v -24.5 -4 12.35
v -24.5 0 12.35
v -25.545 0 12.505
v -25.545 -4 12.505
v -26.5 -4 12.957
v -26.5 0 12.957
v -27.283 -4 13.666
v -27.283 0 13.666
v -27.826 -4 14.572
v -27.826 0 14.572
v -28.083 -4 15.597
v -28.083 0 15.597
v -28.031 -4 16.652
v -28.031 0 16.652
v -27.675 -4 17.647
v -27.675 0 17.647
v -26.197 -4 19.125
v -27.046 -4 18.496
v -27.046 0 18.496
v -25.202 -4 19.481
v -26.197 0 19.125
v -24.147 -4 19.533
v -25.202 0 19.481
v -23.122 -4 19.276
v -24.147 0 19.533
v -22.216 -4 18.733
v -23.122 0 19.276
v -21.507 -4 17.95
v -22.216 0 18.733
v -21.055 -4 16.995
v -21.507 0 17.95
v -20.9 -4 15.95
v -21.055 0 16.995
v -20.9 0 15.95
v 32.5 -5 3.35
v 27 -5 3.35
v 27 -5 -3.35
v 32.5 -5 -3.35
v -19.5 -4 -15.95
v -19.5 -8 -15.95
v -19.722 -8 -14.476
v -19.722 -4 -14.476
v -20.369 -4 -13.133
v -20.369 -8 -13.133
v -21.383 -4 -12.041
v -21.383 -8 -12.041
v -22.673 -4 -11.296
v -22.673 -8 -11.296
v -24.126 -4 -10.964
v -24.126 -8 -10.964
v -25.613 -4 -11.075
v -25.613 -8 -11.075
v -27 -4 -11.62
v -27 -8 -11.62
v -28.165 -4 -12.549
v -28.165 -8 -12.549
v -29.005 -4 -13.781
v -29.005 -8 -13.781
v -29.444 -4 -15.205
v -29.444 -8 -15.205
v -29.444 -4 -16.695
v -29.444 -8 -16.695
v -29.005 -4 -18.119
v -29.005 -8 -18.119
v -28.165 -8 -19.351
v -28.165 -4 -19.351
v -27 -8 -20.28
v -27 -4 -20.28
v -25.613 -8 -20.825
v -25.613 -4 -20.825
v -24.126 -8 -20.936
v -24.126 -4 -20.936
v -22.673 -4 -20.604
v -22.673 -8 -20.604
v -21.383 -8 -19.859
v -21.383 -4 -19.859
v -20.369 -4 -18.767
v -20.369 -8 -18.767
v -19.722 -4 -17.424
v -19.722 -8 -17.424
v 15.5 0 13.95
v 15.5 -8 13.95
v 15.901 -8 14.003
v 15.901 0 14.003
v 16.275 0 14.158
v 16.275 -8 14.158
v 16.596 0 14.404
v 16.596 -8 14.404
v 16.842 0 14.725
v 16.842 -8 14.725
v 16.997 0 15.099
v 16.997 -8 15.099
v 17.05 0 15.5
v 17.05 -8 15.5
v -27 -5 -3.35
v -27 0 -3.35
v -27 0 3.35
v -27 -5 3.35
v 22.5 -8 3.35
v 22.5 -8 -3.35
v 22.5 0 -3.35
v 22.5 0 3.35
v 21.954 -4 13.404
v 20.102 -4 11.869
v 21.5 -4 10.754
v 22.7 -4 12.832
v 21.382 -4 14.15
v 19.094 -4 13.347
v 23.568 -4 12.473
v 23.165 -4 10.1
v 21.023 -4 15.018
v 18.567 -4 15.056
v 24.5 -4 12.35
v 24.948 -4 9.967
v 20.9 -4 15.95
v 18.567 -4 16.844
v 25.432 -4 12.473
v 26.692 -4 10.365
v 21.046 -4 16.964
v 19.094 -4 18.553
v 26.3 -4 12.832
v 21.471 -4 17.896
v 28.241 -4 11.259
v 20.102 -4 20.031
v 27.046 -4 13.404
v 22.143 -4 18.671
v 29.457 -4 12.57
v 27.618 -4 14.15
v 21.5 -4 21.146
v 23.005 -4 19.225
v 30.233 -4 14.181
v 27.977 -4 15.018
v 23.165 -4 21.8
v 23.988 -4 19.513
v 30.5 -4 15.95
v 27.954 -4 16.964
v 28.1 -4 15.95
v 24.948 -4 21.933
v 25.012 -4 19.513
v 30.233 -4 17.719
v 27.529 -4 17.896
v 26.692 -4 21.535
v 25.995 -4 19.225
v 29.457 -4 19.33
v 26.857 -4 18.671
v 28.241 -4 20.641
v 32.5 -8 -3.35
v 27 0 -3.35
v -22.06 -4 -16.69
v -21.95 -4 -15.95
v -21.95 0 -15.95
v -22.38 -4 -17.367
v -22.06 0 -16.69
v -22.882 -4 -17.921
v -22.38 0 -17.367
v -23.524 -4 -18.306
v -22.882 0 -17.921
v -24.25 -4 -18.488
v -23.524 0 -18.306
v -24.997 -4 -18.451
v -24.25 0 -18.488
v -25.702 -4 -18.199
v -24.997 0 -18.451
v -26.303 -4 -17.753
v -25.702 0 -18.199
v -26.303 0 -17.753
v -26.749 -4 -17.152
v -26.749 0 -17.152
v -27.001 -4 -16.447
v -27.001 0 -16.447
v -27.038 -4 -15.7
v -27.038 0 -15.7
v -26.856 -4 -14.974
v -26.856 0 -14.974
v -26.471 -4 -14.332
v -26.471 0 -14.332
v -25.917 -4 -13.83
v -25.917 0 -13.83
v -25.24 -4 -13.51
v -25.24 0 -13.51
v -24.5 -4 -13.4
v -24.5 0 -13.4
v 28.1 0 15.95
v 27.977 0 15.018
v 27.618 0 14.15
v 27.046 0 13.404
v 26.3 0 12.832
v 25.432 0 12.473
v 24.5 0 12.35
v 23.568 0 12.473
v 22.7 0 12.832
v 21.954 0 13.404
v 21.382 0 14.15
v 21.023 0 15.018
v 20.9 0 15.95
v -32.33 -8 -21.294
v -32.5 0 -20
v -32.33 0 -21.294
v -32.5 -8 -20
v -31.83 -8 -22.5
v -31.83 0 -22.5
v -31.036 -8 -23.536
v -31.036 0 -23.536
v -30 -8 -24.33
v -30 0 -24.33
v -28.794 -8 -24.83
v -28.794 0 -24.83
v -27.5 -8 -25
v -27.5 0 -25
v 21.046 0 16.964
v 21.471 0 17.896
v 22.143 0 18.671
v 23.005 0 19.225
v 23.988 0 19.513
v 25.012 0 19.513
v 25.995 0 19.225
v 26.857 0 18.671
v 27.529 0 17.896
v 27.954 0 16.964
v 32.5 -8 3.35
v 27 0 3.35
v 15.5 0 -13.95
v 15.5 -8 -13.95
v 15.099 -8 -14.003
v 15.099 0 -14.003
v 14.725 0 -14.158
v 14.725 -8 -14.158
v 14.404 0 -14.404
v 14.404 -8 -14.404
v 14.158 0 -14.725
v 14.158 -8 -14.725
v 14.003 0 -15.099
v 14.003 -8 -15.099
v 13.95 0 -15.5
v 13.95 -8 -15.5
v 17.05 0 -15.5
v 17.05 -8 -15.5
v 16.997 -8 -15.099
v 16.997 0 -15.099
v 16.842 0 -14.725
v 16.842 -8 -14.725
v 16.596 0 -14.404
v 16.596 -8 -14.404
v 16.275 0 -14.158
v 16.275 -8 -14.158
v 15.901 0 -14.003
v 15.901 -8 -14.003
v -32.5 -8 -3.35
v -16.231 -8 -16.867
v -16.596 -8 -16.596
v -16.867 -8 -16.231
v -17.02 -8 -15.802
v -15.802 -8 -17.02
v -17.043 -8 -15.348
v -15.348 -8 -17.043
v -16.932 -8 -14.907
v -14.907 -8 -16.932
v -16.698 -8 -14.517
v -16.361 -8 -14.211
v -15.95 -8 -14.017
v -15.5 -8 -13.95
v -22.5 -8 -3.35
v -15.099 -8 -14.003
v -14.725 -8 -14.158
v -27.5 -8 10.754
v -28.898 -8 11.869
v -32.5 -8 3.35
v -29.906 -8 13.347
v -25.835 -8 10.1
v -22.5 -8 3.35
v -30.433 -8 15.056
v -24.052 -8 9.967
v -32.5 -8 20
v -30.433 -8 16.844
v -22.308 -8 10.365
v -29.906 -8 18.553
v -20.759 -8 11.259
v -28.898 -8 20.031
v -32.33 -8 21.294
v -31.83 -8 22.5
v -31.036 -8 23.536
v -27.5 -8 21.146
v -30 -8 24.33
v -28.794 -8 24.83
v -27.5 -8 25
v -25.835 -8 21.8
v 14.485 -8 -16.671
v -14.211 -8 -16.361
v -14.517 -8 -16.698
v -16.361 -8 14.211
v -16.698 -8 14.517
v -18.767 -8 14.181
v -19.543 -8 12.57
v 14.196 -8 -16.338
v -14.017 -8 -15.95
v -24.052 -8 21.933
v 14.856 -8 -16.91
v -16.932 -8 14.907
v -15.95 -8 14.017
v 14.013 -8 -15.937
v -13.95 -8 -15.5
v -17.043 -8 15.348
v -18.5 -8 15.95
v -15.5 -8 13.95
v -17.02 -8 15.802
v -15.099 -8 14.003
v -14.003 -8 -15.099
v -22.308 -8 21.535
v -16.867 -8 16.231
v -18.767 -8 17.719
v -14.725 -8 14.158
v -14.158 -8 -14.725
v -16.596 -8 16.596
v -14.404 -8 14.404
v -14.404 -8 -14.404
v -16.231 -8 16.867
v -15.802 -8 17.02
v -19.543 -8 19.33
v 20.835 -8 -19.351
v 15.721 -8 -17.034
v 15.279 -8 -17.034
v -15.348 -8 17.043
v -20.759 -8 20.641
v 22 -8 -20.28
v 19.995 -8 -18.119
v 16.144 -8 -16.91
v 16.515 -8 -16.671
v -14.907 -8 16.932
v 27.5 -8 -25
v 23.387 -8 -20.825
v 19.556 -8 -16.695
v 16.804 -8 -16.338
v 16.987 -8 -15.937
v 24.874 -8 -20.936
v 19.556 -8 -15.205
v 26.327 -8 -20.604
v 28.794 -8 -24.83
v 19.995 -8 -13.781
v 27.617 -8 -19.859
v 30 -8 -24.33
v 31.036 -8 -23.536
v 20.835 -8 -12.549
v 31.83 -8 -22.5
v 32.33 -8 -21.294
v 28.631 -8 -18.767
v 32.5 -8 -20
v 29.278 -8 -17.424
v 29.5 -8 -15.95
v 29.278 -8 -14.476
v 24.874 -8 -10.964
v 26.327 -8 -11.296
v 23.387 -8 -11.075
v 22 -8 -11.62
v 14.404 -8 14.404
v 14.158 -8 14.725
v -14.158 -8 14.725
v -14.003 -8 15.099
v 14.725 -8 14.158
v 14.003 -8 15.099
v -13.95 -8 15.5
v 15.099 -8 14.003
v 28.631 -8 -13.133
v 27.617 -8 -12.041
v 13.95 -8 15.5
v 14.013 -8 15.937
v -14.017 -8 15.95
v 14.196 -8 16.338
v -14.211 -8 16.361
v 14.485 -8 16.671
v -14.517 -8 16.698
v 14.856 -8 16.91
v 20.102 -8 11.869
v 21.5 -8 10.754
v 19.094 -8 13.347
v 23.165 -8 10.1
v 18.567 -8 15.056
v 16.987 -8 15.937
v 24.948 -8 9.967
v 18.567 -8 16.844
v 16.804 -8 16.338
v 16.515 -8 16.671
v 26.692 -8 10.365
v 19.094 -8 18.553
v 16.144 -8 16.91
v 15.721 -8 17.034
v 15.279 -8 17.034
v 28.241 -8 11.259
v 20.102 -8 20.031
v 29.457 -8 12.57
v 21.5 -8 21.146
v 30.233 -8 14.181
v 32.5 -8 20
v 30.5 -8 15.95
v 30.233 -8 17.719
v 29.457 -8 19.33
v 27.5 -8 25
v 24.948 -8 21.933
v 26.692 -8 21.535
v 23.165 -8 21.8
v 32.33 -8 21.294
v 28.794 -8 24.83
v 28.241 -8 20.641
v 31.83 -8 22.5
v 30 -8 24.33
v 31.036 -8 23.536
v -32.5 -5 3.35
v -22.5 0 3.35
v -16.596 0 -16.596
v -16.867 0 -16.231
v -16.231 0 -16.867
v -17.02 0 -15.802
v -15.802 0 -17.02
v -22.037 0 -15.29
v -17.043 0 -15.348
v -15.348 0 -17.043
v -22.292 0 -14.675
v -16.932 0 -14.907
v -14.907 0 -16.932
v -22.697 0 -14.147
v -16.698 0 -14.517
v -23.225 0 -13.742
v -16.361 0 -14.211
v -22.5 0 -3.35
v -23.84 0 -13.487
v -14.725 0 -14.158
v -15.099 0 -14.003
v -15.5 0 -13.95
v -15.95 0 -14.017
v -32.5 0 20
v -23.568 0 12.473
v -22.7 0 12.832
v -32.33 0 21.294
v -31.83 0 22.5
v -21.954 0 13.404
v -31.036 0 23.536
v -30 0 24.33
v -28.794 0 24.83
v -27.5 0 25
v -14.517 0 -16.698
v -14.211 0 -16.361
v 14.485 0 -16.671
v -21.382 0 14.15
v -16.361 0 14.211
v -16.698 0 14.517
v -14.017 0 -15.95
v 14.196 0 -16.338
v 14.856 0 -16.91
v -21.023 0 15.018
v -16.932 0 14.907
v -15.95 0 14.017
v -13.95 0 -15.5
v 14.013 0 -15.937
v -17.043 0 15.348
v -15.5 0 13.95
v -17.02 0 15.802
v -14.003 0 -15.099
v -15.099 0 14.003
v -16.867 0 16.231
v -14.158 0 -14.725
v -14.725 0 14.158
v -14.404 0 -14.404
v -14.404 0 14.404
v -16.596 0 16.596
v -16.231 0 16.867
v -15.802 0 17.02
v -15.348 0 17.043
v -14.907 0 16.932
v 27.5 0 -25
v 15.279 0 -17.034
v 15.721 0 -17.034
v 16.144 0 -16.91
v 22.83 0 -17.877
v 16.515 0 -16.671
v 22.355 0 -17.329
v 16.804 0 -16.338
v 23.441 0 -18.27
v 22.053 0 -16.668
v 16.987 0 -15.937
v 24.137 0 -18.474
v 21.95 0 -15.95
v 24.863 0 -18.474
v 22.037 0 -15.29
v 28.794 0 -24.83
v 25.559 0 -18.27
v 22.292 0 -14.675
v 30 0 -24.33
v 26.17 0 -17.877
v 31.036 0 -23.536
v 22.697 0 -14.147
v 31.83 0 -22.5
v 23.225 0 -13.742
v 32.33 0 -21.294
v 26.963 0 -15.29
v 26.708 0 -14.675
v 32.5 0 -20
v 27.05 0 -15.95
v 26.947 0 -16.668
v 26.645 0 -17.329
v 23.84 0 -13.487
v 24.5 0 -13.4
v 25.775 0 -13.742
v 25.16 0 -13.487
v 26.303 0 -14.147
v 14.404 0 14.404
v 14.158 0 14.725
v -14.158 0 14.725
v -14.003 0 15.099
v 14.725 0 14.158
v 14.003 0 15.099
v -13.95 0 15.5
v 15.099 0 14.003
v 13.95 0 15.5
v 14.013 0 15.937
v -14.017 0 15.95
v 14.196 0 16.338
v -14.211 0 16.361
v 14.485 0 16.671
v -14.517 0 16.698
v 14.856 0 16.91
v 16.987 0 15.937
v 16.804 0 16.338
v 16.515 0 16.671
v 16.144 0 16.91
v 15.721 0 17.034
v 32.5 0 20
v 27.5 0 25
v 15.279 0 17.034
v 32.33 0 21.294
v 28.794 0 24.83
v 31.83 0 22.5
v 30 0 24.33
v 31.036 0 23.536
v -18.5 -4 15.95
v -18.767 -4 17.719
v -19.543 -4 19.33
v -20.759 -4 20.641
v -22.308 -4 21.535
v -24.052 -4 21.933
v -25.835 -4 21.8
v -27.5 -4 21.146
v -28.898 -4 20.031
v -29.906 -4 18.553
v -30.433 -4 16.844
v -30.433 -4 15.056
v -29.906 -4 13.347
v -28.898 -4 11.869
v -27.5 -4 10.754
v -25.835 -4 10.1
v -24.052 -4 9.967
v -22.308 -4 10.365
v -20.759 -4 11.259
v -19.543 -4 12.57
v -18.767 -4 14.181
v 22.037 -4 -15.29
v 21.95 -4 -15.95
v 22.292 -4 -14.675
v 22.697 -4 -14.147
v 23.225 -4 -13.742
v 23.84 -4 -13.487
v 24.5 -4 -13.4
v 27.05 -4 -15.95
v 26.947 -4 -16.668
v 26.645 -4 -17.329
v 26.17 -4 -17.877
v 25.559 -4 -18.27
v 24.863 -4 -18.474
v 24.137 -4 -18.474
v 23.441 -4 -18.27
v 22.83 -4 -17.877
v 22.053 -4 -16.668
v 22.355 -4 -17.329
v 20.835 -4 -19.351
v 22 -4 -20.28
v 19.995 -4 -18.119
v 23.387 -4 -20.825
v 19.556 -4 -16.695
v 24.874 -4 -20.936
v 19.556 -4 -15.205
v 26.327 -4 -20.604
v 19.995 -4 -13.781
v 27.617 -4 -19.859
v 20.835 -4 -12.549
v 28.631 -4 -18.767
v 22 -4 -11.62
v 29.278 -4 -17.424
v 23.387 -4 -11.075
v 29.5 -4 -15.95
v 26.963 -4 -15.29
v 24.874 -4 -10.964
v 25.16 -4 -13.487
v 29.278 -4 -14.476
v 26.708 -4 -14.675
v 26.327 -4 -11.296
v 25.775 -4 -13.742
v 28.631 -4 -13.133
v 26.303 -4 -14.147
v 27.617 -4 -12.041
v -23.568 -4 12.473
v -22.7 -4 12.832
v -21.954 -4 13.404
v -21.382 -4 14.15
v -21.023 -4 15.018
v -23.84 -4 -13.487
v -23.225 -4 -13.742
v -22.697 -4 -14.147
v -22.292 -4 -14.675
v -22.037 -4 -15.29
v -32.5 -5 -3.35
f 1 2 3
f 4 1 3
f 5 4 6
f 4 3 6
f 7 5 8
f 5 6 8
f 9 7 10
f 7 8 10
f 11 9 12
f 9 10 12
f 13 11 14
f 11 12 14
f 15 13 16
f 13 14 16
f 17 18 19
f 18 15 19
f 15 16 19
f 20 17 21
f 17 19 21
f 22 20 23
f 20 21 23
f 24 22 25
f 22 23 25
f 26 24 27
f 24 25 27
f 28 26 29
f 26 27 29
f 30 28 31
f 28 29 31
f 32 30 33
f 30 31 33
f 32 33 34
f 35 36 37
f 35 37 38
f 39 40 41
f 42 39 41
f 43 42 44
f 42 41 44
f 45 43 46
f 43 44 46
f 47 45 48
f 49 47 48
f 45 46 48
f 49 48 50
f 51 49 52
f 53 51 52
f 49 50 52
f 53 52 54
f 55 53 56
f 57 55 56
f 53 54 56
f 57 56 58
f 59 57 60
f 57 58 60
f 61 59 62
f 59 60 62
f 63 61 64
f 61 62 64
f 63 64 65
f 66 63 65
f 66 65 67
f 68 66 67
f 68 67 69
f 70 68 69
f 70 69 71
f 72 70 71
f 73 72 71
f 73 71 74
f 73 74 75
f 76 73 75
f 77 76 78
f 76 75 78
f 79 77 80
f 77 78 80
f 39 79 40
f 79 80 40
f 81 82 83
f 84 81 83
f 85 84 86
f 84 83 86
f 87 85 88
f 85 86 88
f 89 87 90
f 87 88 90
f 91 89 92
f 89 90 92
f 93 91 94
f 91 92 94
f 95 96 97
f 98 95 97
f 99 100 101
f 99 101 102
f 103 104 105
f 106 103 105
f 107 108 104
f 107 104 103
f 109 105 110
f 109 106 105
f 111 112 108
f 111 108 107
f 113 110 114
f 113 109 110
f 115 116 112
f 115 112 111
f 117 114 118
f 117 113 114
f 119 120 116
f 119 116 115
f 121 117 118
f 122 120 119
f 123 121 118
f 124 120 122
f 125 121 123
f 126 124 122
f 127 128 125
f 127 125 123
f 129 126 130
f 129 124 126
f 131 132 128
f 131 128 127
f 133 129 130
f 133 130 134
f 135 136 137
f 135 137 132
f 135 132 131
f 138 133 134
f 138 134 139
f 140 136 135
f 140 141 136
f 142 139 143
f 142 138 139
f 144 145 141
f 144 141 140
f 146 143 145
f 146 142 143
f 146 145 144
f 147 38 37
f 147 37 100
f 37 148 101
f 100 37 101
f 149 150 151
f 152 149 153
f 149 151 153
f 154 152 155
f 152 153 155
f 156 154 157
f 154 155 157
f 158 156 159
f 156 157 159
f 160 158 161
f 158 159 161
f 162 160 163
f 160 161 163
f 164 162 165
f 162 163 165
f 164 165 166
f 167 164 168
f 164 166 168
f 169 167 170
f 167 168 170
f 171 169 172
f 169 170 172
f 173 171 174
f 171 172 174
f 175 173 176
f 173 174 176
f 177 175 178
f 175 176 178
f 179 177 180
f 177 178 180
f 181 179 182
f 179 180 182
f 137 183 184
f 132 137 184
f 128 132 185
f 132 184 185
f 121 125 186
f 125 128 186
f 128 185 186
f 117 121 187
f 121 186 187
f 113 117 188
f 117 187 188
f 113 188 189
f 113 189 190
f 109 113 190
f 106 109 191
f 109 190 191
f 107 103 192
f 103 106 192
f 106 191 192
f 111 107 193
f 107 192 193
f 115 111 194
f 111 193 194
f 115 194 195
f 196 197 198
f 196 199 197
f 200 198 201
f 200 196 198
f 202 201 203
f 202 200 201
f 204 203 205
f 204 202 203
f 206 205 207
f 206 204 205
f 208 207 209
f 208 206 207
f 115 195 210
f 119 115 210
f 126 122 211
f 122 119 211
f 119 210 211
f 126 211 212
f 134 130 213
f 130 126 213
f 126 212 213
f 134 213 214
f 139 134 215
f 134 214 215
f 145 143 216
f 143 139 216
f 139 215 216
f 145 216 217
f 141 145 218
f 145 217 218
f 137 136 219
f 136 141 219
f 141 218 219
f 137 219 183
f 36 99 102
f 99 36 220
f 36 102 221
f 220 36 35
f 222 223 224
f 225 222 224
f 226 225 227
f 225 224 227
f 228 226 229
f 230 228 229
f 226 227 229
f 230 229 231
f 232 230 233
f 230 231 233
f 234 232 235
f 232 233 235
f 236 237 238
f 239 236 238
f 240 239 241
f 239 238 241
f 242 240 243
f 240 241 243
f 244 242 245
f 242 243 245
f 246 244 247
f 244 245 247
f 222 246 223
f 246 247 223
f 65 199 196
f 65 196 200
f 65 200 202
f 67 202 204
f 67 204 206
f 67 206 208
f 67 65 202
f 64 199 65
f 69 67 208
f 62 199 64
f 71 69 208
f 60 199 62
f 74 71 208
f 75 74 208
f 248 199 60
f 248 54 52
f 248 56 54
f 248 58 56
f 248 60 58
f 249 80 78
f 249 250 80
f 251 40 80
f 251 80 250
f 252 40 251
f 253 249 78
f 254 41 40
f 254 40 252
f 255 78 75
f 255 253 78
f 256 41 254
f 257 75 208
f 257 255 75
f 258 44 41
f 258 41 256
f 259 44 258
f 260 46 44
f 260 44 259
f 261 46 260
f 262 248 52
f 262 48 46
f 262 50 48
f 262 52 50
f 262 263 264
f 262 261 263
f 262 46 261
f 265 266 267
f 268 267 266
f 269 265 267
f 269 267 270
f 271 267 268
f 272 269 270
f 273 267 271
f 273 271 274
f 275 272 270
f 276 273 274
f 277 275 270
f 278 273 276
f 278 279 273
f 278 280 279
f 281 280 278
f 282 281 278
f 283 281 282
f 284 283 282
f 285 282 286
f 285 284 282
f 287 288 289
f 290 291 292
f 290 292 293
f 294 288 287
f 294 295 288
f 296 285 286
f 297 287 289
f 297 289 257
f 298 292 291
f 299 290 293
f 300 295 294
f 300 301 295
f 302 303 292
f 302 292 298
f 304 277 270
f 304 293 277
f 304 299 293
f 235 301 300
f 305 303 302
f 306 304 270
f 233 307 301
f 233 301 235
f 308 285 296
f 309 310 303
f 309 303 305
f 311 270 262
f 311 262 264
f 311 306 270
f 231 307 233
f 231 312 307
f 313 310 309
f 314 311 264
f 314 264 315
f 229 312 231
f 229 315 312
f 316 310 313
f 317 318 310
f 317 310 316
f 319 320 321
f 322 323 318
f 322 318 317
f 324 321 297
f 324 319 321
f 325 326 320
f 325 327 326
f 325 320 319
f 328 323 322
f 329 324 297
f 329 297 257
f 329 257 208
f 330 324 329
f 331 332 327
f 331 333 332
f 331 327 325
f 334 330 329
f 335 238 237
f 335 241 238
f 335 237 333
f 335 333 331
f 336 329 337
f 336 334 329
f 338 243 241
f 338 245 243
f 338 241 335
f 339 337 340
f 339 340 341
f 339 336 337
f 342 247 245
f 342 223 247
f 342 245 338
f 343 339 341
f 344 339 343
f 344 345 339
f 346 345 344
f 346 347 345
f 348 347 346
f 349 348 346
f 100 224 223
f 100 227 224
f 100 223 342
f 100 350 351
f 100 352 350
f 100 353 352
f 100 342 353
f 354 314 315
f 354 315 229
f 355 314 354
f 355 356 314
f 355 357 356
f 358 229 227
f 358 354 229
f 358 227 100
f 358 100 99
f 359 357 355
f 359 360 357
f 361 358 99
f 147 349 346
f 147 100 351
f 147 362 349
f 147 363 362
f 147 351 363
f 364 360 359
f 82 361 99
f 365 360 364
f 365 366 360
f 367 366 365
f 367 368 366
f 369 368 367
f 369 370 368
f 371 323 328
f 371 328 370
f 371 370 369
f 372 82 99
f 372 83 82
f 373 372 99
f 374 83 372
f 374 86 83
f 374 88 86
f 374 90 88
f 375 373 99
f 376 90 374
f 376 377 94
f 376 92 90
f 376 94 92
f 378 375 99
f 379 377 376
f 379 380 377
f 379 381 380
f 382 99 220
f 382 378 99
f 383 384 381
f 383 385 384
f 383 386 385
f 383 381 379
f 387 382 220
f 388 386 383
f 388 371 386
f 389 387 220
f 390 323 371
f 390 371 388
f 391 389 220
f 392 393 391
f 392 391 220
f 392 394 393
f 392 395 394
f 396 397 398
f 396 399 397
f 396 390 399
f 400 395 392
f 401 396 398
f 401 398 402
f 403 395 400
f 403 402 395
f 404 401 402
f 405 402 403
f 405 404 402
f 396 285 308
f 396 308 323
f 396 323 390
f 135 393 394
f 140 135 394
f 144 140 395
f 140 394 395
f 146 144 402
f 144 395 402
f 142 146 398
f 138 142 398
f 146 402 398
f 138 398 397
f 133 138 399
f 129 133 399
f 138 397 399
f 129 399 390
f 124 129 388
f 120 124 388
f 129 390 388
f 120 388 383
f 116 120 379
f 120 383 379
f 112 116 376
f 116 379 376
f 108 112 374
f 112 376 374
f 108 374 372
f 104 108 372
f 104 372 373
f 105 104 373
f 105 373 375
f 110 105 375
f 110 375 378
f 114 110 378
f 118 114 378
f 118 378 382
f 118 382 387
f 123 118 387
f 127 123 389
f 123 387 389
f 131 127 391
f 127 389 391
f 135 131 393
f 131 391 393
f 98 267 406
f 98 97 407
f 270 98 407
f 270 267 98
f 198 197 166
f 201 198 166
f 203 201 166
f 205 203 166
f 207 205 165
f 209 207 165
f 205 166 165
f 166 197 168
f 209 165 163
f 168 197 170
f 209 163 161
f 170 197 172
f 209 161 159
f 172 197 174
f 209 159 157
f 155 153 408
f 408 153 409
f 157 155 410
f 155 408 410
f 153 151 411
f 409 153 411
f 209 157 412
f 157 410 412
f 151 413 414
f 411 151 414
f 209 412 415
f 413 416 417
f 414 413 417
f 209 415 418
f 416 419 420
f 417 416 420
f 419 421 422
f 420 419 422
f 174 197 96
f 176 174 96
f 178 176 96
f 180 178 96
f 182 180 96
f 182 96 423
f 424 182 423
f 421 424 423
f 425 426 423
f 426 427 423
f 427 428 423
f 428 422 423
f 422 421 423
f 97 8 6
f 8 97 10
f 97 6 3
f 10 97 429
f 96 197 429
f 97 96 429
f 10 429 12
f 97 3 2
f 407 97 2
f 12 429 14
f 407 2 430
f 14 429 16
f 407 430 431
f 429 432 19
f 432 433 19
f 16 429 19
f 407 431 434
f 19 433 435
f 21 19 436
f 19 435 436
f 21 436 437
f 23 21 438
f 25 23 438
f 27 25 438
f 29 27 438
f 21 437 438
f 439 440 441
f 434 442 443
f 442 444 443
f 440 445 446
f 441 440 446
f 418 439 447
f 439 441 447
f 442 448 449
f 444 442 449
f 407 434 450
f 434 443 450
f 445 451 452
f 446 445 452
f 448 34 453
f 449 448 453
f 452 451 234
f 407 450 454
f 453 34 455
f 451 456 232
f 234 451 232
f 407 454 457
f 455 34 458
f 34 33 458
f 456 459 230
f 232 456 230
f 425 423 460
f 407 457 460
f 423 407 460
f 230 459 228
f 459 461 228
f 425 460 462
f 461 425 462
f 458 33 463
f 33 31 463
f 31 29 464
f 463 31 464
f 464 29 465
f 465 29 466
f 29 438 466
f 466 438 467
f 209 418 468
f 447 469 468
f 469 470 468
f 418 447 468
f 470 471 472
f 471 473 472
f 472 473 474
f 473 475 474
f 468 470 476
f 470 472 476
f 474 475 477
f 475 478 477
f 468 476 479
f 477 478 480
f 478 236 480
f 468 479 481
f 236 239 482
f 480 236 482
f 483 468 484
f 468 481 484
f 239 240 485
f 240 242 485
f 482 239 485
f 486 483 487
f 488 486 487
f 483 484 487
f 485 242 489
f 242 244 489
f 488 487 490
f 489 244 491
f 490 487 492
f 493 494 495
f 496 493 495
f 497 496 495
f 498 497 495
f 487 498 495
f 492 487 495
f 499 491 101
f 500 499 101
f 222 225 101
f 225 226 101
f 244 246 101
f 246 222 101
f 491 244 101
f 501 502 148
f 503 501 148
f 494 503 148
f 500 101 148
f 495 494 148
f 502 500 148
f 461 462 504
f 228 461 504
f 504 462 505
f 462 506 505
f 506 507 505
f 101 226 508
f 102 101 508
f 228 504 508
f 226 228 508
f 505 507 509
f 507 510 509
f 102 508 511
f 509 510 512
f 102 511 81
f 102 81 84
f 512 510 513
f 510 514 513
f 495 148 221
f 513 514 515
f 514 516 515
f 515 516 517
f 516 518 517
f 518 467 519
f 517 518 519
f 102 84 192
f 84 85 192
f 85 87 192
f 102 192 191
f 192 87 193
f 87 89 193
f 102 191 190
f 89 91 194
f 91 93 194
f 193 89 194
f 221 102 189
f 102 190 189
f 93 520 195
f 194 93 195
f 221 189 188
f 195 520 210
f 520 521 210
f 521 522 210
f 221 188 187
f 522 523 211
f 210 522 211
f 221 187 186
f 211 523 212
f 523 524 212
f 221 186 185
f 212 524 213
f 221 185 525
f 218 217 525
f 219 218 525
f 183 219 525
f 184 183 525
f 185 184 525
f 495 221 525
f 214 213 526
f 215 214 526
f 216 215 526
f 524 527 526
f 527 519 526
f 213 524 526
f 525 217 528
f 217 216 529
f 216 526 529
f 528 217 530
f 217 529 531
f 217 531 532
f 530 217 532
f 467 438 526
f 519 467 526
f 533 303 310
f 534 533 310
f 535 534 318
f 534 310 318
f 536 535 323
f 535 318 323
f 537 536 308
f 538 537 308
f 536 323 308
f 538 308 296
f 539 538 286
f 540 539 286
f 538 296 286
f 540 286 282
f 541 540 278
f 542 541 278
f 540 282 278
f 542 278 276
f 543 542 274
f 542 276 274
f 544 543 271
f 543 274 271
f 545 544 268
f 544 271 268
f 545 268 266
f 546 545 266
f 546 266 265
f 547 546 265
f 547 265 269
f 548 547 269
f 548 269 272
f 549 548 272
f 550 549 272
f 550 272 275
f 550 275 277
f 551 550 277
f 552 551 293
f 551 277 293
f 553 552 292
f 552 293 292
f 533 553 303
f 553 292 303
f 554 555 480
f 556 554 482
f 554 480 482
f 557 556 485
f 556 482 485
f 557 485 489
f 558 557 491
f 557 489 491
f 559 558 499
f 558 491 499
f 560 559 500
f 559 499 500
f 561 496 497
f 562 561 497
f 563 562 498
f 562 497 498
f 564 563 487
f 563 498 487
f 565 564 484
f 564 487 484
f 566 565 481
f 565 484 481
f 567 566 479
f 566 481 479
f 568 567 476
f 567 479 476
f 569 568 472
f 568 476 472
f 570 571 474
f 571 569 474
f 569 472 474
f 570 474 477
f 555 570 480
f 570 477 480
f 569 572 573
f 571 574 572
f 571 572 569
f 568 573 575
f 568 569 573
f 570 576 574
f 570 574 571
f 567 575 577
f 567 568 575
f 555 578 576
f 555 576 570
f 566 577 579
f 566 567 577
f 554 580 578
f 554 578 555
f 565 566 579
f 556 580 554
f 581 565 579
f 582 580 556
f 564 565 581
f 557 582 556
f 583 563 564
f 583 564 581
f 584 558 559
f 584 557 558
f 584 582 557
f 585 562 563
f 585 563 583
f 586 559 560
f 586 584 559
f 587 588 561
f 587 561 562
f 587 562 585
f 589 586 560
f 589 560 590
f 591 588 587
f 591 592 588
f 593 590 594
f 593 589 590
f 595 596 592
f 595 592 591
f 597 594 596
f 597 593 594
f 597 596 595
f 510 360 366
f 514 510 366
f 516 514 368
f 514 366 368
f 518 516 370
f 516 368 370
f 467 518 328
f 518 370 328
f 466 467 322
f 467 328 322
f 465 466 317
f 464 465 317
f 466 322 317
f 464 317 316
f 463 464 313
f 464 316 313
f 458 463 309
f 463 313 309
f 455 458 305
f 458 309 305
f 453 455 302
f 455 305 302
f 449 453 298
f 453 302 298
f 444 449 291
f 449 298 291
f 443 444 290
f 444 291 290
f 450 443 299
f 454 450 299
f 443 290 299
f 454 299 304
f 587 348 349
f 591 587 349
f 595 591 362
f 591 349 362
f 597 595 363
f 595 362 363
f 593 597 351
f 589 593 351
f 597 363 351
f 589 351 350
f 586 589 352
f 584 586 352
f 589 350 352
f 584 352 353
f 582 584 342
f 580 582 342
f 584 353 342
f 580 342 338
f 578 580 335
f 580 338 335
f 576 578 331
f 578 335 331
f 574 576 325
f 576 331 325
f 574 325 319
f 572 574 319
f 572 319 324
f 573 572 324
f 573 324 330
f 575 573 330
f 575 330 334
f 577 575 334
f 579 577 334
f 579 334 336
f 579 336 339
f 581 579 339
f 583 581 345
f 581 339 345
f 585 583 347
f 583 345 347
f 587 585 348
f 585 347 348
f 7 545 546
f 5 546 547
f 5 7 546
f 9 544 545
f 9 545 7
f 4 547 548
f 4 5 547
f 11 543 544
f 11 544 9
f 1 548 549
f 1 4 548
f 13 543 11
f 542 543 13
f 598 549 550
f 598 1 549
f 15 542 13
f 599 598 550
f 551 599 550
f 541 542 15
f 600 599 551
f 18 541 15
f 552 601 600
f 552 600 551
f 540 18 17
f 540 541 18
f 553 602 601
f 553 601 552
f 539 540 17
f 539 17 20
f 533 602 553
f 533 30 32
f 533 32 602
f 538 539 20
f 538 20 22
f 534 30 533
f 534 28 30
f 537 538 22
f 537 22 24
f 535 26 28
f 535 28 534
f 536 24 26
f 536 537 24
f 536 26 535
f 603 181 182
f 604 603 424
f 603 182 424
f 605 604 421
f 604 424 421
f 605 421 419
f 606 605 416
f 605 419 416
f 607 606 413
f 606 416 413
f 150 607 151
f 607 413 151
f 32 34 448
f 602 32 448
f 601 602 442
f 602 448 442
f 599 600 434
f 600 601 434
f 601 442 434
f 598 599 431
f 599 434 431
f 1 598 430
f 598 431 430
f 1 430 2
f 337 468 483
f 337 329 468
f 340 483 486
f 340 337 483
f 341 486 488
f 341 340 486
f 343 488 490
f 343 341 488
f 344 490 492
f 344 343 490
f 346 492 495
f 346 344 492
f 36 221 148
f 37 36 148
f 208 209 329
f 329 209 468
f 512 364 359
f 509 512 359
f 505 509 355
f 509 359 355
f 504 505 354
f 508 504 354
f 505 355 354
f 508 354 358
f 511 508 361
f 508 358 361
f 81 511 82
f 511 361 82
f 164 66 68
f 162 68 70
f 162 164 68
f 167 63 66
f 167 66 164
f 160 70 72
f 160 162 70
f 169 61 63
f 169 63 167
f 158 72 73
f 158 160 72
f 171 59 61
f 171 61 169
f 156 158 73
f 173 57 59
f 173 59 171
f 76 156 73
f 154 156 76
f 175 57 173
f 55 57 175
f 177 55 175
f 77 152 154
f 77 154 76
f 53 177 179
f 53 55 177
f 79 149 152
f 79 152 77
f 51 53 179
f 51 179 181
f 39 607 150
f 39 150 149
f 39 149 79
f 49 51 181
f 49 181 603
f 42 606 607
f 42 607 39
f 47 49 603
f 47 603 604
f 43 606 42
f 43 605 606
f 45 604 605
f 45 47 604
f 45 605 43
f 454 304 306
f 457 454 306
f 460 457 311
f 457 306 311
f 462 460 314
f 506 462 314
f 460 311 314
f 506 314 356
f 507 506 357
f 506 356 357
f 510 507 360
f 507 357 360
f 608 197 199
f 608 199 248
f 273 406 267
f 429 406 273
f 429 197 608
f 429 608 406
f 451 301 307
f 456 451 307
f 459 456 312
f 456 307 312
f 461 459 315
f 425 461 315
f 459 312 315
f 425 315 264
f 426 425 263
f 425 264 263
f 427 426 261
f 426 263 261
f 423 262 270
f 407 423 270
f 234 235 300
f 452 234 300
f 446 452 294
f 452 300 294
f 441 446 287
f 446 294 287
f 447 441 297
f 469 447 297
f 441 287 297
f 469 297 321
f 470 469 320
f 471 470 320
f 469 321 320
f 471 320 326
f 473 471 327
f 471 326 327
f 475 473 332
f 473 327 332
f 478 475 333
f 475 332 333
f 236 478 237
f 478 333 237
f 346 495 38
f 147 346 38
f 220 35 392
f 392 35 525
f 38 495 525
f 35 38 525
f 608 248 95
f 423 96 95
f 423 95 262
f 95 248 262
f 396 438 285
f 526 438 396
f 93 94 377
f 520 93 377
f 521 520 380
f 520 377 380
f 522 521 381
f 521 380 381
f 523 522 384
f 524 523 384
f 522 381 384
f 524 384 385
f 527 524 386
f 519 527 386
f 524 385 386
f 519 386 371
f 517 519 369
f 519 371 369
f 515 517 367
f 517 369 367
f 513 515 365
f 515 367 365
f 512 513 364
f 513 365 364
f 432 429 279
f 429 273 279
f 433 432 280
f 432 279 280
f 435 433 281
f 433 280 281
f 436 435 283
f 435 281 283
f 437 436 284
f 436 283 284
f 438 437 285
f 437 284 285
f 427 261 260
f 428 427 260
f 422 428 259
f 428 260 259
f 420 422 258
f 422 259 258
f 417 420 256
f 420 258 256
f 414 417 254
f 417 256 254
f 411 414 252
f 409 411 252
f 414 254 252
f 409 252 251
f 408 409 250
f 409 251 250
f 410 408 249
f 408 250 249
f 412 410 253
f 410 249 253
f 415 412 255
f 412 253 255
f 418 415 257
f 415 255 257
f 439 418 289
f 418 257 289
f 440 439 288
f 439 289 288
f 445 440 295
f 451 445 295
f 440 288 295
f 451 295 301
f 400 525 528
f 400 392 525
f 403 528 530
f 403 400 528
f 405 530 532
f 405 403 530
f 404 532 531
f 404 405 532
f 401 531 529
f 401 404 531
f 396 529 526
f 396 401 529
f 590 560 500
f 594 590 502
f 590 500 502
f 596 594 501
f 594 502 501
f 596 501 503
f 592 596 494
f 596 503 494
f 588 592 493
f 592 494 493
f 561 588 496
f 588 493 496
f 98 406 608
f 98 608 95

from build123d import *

# Parameters (mm, degrees)
F0_W     = 65
F0_H     = 50
F0_W_2   = 45
F0_H_2   = 6.7
F1_DEPTH = 8
F2_R     = 6
F2_R_2   = 3.6
F2_R_3   = 5
F2_R_4   = 2.55
F3_DEPTH = 4
F4_W     = 5.5
F4_H     = 6.7
F5_DEPTH = 3
F6_R     = 5
F8_DEPTH = 25


with BuildPart() as f1:
    # F0 (on Front) → F1 (new body)
    with BuildSketch(Plane.XZ):
        Rectangle(F0_W, F0_H)
        with BuildLine():
            ThreePointArc((-24.5, 12.35), (-27.0455844123, 18.4955844123), (-20.9, 15.95))
            Line((-20.9, 15.95), (20.9, 15.95))
            ThreePointArc((20.9, 15.95), (24.5, 19.55), (28.1, 15.95))
            ThreePointArc((28.1, 15.95), (27.0455844123, 13.4044155877), (24.5, 12.35))
            Line((24.5, 12.35), (24.5, 3.35))
            Line((24.5, 3.35), (27, 3.35))
            Line((27, 3.35), (27, -3.35))
            Line((27, -3.35), (24.5, -3.35))
            Line((24.5, -3.35), (24.5, -13.4))
            ThreePointArc((24.5, -13.4), (26.303122292, -14.146877708), (27.05, -15.95))
            ThreePointArc((27.05, -15.95), (24.5, -18.5), (21.95, -15.95))
            Line((21.95, -15.95), (-21.95, -15.95))
            ThreePointArc((-21.95, -15.95), (-26.303122292, -17.753122292), (-24.5, -13.4))
            Line((-24.5, -13.4), (-24.5, -3.35))
            Line((-24.5, -3.35), (-27, -3.35))
            Line((-27, -3.35), (-27, 3.35))
            Line((-27, 3.35), (-24.5, 3.35))
            Line((-24.5, 3.35), (-24.5, 12.35))
        make_face(mode=Mode.SUBTRACT)
        with BuildLine():
            Line((20.9, 15.95), (-20.9, 15.95))
            ThreePointArc((-20.9, 15.95), (-21.9544155877, 13.4044155877), (-24.5, 12.35))
            Line((-24.5, 12.35), (-24.5, 3.35))
            Line((-24.5, 3.35), (-22.5, 3.35))
            Line((-22.5, 3.35), (22.5, 3.35))
            Line((22.5, 3.35), (24.5, 3.35))
            Line((24.5, 3.35), (24.5, 12.35))
            ThreePointArc((24.5, 12.35), (21.9544155877, 13.4044155877), (20.9, 15.95))
        make_face()
        with BuildLine():
            Line((-22.5, -3.35), (-24.5, -3.35))
            Line((-24.5, -3.35), (-24.5, -13.4))
            ThreePointArc((-24.5, -13.4), (-22.696877708, -14.146877708), (-21.95, -15.95))
            Line((-21.95, -15.95), (21.95, -15.95))
            ThreePointArc((21.95, -15.95), (22.696877708, -14.146877708), (24.5, -13.4))
            Line((24.5, -13.4), (24.5, -3.35))
            Line((24.5, -3.35), (22.5, -3.35))
            Line((22.5, -3.35), (-22.5, -3.35))
        make_face()
        Rectangle(F0_W_2, F0_H_2)
    extrude(amount=F1_DEPTH)

    # F2 (on face) → F3 (cut)
    with BuildSketch(Plane.XZ.offset(8)):
        with Locations((24.5, 15.95)):
            Circle(F2_R)
        with Locations((24.5, 15.95)):
            Circle(F2_R_2, mode=Mode.SUBTRACT)
        with Locations((-24.5, 15.95)):
            Circle(F2_R)
        with Locations((-24.5, 15.95)):
            Circle(F2_R_2, mode=Mode.SUBTRACT)
        with Locations((-24.5, -15.95)):
            Circle(F2_R_3)
        with Locations((-24.5, -15.95)):
            Circle(F2_R_4, mode=Mode.SUBTRACT)
        with Locations((24.5, -15.95)):
            Circle(F2_R_3)
        with Locations((24.5, -15.95)):
            Circle(F2_R_4, mode=Mode.SUBTRACT)
    extrude(amount=-F3_DEPTH, mode=Mode.SUBTRACT)

    # F4 (on face) → F5 (cut)
    with BuildSketch(Plane.XZ.offset(8)):
        with Locations((29.75, 0)):
            Rectangle(F4_W, F4_H)
        with Locations((-29.75, 0)):
            Rectangle(F4_W, F4_H)
    extrude(amount=-F5_DEPTH, mode=Mode.SUBTRACT)

    # F6
    f6_edges = [f1.edges().sort_by_distance(p)[0] for p in [
        (-32.5, -4, 25),
        (32.5, -4, 25),
        (32.5, -4, -25),
        (-32.5, -4, -25),
    ]]
    fillet(f6_edges, radius=F6_R)

    # F7 (on face) → F8 (cut)
    with BuildSketch(Plane.XZ.offset(8)):
        with BuildLine():
            Line((-15.5, 13.95), (-15.5, 15.5))
            Line((-15.5, 15.5), (-13.95, 15.5))
            ThreePointArc((-13.95, 15.5), (-16.5960155108, 16.5960155108), (-15.5, 13.95))
        make_face()
        with BuildLine():
            Line((-13.95, 15.5), (-15.5, 15.5))
            Line((-15.5, 15.5), (-15.5, 13.95))
            ThreePointArc((-15.5, 13.95), (-14.4039844892, 14.4039844892), (-13.95, 15.5))
        make_face()
        with BuildLine():
            ThreePointArc((-13.95, -15.5), (-14.4039844892, -14.4039844892), (-15.5, -13.95))
            Line((-15.5, -13.95), (-15.5, -15.5))
            Line((-15.5, -15.5), (-13.95, -15.5))
        make_face()
        with BuildLine():
            Line((-15.5, -15.5), (-15.5, -13.95))
            ThreePointArc((-15.5, -13.95), (-16.5960155108, -16.5960155108), (-13.95, -15.5))
            Line((-13.95, -15.5), (-15.5, -15.5))
        make_face()
        with BuildLine():
            Line((15.5, -15.5), (15.5, -13.95))
            ThreePointArc((15.5, -13.95), (14.4039844892, -14.4039844892), (13.95, -15.5))
            Line((13.95, -15.5), (15.5, -15.5))
        make_face()
        with BuildLine():
            ThreePointArc((17.05, -15.5), (16.5960155108, -14.4039844892), (15.5, -13.95))
            Line((15.5, -13.95), (15.5, -15.5))
            Line((15.5, -15.5), (13.95, -15.5))
            ThreePointArc((13.95, -15.5), (15.5, -17.05), (17.05, -15.5))
        make_face()
        with BuildLine():
            Line((15.5, 15.5), (13.95, 15.5))
            ThreePointArc((13.95, 15.5), (14.4039844892, 14.4039844892), (15.5, 13.95))
            Line((15.5, 13.95), (15.5, 15.5))
        make_face()
        with BuildLine():
            ThreePointArc((17.05, 15.5), (15.5, 17.05), (13.95, 15.5))
            Line((13.95, 15.5), (15.5, 15.5))
            Line((15.5, 15.5), (15.5, 13.95))
            ThreePointArc((15.5, 13.95), (16.5960155108, 14.4039844892), (17.05, 15.5))
        make_face()
    extrude(amount=-F8_DEPTH, mode=Mode.SUBTRACT)


solid = f1.part
